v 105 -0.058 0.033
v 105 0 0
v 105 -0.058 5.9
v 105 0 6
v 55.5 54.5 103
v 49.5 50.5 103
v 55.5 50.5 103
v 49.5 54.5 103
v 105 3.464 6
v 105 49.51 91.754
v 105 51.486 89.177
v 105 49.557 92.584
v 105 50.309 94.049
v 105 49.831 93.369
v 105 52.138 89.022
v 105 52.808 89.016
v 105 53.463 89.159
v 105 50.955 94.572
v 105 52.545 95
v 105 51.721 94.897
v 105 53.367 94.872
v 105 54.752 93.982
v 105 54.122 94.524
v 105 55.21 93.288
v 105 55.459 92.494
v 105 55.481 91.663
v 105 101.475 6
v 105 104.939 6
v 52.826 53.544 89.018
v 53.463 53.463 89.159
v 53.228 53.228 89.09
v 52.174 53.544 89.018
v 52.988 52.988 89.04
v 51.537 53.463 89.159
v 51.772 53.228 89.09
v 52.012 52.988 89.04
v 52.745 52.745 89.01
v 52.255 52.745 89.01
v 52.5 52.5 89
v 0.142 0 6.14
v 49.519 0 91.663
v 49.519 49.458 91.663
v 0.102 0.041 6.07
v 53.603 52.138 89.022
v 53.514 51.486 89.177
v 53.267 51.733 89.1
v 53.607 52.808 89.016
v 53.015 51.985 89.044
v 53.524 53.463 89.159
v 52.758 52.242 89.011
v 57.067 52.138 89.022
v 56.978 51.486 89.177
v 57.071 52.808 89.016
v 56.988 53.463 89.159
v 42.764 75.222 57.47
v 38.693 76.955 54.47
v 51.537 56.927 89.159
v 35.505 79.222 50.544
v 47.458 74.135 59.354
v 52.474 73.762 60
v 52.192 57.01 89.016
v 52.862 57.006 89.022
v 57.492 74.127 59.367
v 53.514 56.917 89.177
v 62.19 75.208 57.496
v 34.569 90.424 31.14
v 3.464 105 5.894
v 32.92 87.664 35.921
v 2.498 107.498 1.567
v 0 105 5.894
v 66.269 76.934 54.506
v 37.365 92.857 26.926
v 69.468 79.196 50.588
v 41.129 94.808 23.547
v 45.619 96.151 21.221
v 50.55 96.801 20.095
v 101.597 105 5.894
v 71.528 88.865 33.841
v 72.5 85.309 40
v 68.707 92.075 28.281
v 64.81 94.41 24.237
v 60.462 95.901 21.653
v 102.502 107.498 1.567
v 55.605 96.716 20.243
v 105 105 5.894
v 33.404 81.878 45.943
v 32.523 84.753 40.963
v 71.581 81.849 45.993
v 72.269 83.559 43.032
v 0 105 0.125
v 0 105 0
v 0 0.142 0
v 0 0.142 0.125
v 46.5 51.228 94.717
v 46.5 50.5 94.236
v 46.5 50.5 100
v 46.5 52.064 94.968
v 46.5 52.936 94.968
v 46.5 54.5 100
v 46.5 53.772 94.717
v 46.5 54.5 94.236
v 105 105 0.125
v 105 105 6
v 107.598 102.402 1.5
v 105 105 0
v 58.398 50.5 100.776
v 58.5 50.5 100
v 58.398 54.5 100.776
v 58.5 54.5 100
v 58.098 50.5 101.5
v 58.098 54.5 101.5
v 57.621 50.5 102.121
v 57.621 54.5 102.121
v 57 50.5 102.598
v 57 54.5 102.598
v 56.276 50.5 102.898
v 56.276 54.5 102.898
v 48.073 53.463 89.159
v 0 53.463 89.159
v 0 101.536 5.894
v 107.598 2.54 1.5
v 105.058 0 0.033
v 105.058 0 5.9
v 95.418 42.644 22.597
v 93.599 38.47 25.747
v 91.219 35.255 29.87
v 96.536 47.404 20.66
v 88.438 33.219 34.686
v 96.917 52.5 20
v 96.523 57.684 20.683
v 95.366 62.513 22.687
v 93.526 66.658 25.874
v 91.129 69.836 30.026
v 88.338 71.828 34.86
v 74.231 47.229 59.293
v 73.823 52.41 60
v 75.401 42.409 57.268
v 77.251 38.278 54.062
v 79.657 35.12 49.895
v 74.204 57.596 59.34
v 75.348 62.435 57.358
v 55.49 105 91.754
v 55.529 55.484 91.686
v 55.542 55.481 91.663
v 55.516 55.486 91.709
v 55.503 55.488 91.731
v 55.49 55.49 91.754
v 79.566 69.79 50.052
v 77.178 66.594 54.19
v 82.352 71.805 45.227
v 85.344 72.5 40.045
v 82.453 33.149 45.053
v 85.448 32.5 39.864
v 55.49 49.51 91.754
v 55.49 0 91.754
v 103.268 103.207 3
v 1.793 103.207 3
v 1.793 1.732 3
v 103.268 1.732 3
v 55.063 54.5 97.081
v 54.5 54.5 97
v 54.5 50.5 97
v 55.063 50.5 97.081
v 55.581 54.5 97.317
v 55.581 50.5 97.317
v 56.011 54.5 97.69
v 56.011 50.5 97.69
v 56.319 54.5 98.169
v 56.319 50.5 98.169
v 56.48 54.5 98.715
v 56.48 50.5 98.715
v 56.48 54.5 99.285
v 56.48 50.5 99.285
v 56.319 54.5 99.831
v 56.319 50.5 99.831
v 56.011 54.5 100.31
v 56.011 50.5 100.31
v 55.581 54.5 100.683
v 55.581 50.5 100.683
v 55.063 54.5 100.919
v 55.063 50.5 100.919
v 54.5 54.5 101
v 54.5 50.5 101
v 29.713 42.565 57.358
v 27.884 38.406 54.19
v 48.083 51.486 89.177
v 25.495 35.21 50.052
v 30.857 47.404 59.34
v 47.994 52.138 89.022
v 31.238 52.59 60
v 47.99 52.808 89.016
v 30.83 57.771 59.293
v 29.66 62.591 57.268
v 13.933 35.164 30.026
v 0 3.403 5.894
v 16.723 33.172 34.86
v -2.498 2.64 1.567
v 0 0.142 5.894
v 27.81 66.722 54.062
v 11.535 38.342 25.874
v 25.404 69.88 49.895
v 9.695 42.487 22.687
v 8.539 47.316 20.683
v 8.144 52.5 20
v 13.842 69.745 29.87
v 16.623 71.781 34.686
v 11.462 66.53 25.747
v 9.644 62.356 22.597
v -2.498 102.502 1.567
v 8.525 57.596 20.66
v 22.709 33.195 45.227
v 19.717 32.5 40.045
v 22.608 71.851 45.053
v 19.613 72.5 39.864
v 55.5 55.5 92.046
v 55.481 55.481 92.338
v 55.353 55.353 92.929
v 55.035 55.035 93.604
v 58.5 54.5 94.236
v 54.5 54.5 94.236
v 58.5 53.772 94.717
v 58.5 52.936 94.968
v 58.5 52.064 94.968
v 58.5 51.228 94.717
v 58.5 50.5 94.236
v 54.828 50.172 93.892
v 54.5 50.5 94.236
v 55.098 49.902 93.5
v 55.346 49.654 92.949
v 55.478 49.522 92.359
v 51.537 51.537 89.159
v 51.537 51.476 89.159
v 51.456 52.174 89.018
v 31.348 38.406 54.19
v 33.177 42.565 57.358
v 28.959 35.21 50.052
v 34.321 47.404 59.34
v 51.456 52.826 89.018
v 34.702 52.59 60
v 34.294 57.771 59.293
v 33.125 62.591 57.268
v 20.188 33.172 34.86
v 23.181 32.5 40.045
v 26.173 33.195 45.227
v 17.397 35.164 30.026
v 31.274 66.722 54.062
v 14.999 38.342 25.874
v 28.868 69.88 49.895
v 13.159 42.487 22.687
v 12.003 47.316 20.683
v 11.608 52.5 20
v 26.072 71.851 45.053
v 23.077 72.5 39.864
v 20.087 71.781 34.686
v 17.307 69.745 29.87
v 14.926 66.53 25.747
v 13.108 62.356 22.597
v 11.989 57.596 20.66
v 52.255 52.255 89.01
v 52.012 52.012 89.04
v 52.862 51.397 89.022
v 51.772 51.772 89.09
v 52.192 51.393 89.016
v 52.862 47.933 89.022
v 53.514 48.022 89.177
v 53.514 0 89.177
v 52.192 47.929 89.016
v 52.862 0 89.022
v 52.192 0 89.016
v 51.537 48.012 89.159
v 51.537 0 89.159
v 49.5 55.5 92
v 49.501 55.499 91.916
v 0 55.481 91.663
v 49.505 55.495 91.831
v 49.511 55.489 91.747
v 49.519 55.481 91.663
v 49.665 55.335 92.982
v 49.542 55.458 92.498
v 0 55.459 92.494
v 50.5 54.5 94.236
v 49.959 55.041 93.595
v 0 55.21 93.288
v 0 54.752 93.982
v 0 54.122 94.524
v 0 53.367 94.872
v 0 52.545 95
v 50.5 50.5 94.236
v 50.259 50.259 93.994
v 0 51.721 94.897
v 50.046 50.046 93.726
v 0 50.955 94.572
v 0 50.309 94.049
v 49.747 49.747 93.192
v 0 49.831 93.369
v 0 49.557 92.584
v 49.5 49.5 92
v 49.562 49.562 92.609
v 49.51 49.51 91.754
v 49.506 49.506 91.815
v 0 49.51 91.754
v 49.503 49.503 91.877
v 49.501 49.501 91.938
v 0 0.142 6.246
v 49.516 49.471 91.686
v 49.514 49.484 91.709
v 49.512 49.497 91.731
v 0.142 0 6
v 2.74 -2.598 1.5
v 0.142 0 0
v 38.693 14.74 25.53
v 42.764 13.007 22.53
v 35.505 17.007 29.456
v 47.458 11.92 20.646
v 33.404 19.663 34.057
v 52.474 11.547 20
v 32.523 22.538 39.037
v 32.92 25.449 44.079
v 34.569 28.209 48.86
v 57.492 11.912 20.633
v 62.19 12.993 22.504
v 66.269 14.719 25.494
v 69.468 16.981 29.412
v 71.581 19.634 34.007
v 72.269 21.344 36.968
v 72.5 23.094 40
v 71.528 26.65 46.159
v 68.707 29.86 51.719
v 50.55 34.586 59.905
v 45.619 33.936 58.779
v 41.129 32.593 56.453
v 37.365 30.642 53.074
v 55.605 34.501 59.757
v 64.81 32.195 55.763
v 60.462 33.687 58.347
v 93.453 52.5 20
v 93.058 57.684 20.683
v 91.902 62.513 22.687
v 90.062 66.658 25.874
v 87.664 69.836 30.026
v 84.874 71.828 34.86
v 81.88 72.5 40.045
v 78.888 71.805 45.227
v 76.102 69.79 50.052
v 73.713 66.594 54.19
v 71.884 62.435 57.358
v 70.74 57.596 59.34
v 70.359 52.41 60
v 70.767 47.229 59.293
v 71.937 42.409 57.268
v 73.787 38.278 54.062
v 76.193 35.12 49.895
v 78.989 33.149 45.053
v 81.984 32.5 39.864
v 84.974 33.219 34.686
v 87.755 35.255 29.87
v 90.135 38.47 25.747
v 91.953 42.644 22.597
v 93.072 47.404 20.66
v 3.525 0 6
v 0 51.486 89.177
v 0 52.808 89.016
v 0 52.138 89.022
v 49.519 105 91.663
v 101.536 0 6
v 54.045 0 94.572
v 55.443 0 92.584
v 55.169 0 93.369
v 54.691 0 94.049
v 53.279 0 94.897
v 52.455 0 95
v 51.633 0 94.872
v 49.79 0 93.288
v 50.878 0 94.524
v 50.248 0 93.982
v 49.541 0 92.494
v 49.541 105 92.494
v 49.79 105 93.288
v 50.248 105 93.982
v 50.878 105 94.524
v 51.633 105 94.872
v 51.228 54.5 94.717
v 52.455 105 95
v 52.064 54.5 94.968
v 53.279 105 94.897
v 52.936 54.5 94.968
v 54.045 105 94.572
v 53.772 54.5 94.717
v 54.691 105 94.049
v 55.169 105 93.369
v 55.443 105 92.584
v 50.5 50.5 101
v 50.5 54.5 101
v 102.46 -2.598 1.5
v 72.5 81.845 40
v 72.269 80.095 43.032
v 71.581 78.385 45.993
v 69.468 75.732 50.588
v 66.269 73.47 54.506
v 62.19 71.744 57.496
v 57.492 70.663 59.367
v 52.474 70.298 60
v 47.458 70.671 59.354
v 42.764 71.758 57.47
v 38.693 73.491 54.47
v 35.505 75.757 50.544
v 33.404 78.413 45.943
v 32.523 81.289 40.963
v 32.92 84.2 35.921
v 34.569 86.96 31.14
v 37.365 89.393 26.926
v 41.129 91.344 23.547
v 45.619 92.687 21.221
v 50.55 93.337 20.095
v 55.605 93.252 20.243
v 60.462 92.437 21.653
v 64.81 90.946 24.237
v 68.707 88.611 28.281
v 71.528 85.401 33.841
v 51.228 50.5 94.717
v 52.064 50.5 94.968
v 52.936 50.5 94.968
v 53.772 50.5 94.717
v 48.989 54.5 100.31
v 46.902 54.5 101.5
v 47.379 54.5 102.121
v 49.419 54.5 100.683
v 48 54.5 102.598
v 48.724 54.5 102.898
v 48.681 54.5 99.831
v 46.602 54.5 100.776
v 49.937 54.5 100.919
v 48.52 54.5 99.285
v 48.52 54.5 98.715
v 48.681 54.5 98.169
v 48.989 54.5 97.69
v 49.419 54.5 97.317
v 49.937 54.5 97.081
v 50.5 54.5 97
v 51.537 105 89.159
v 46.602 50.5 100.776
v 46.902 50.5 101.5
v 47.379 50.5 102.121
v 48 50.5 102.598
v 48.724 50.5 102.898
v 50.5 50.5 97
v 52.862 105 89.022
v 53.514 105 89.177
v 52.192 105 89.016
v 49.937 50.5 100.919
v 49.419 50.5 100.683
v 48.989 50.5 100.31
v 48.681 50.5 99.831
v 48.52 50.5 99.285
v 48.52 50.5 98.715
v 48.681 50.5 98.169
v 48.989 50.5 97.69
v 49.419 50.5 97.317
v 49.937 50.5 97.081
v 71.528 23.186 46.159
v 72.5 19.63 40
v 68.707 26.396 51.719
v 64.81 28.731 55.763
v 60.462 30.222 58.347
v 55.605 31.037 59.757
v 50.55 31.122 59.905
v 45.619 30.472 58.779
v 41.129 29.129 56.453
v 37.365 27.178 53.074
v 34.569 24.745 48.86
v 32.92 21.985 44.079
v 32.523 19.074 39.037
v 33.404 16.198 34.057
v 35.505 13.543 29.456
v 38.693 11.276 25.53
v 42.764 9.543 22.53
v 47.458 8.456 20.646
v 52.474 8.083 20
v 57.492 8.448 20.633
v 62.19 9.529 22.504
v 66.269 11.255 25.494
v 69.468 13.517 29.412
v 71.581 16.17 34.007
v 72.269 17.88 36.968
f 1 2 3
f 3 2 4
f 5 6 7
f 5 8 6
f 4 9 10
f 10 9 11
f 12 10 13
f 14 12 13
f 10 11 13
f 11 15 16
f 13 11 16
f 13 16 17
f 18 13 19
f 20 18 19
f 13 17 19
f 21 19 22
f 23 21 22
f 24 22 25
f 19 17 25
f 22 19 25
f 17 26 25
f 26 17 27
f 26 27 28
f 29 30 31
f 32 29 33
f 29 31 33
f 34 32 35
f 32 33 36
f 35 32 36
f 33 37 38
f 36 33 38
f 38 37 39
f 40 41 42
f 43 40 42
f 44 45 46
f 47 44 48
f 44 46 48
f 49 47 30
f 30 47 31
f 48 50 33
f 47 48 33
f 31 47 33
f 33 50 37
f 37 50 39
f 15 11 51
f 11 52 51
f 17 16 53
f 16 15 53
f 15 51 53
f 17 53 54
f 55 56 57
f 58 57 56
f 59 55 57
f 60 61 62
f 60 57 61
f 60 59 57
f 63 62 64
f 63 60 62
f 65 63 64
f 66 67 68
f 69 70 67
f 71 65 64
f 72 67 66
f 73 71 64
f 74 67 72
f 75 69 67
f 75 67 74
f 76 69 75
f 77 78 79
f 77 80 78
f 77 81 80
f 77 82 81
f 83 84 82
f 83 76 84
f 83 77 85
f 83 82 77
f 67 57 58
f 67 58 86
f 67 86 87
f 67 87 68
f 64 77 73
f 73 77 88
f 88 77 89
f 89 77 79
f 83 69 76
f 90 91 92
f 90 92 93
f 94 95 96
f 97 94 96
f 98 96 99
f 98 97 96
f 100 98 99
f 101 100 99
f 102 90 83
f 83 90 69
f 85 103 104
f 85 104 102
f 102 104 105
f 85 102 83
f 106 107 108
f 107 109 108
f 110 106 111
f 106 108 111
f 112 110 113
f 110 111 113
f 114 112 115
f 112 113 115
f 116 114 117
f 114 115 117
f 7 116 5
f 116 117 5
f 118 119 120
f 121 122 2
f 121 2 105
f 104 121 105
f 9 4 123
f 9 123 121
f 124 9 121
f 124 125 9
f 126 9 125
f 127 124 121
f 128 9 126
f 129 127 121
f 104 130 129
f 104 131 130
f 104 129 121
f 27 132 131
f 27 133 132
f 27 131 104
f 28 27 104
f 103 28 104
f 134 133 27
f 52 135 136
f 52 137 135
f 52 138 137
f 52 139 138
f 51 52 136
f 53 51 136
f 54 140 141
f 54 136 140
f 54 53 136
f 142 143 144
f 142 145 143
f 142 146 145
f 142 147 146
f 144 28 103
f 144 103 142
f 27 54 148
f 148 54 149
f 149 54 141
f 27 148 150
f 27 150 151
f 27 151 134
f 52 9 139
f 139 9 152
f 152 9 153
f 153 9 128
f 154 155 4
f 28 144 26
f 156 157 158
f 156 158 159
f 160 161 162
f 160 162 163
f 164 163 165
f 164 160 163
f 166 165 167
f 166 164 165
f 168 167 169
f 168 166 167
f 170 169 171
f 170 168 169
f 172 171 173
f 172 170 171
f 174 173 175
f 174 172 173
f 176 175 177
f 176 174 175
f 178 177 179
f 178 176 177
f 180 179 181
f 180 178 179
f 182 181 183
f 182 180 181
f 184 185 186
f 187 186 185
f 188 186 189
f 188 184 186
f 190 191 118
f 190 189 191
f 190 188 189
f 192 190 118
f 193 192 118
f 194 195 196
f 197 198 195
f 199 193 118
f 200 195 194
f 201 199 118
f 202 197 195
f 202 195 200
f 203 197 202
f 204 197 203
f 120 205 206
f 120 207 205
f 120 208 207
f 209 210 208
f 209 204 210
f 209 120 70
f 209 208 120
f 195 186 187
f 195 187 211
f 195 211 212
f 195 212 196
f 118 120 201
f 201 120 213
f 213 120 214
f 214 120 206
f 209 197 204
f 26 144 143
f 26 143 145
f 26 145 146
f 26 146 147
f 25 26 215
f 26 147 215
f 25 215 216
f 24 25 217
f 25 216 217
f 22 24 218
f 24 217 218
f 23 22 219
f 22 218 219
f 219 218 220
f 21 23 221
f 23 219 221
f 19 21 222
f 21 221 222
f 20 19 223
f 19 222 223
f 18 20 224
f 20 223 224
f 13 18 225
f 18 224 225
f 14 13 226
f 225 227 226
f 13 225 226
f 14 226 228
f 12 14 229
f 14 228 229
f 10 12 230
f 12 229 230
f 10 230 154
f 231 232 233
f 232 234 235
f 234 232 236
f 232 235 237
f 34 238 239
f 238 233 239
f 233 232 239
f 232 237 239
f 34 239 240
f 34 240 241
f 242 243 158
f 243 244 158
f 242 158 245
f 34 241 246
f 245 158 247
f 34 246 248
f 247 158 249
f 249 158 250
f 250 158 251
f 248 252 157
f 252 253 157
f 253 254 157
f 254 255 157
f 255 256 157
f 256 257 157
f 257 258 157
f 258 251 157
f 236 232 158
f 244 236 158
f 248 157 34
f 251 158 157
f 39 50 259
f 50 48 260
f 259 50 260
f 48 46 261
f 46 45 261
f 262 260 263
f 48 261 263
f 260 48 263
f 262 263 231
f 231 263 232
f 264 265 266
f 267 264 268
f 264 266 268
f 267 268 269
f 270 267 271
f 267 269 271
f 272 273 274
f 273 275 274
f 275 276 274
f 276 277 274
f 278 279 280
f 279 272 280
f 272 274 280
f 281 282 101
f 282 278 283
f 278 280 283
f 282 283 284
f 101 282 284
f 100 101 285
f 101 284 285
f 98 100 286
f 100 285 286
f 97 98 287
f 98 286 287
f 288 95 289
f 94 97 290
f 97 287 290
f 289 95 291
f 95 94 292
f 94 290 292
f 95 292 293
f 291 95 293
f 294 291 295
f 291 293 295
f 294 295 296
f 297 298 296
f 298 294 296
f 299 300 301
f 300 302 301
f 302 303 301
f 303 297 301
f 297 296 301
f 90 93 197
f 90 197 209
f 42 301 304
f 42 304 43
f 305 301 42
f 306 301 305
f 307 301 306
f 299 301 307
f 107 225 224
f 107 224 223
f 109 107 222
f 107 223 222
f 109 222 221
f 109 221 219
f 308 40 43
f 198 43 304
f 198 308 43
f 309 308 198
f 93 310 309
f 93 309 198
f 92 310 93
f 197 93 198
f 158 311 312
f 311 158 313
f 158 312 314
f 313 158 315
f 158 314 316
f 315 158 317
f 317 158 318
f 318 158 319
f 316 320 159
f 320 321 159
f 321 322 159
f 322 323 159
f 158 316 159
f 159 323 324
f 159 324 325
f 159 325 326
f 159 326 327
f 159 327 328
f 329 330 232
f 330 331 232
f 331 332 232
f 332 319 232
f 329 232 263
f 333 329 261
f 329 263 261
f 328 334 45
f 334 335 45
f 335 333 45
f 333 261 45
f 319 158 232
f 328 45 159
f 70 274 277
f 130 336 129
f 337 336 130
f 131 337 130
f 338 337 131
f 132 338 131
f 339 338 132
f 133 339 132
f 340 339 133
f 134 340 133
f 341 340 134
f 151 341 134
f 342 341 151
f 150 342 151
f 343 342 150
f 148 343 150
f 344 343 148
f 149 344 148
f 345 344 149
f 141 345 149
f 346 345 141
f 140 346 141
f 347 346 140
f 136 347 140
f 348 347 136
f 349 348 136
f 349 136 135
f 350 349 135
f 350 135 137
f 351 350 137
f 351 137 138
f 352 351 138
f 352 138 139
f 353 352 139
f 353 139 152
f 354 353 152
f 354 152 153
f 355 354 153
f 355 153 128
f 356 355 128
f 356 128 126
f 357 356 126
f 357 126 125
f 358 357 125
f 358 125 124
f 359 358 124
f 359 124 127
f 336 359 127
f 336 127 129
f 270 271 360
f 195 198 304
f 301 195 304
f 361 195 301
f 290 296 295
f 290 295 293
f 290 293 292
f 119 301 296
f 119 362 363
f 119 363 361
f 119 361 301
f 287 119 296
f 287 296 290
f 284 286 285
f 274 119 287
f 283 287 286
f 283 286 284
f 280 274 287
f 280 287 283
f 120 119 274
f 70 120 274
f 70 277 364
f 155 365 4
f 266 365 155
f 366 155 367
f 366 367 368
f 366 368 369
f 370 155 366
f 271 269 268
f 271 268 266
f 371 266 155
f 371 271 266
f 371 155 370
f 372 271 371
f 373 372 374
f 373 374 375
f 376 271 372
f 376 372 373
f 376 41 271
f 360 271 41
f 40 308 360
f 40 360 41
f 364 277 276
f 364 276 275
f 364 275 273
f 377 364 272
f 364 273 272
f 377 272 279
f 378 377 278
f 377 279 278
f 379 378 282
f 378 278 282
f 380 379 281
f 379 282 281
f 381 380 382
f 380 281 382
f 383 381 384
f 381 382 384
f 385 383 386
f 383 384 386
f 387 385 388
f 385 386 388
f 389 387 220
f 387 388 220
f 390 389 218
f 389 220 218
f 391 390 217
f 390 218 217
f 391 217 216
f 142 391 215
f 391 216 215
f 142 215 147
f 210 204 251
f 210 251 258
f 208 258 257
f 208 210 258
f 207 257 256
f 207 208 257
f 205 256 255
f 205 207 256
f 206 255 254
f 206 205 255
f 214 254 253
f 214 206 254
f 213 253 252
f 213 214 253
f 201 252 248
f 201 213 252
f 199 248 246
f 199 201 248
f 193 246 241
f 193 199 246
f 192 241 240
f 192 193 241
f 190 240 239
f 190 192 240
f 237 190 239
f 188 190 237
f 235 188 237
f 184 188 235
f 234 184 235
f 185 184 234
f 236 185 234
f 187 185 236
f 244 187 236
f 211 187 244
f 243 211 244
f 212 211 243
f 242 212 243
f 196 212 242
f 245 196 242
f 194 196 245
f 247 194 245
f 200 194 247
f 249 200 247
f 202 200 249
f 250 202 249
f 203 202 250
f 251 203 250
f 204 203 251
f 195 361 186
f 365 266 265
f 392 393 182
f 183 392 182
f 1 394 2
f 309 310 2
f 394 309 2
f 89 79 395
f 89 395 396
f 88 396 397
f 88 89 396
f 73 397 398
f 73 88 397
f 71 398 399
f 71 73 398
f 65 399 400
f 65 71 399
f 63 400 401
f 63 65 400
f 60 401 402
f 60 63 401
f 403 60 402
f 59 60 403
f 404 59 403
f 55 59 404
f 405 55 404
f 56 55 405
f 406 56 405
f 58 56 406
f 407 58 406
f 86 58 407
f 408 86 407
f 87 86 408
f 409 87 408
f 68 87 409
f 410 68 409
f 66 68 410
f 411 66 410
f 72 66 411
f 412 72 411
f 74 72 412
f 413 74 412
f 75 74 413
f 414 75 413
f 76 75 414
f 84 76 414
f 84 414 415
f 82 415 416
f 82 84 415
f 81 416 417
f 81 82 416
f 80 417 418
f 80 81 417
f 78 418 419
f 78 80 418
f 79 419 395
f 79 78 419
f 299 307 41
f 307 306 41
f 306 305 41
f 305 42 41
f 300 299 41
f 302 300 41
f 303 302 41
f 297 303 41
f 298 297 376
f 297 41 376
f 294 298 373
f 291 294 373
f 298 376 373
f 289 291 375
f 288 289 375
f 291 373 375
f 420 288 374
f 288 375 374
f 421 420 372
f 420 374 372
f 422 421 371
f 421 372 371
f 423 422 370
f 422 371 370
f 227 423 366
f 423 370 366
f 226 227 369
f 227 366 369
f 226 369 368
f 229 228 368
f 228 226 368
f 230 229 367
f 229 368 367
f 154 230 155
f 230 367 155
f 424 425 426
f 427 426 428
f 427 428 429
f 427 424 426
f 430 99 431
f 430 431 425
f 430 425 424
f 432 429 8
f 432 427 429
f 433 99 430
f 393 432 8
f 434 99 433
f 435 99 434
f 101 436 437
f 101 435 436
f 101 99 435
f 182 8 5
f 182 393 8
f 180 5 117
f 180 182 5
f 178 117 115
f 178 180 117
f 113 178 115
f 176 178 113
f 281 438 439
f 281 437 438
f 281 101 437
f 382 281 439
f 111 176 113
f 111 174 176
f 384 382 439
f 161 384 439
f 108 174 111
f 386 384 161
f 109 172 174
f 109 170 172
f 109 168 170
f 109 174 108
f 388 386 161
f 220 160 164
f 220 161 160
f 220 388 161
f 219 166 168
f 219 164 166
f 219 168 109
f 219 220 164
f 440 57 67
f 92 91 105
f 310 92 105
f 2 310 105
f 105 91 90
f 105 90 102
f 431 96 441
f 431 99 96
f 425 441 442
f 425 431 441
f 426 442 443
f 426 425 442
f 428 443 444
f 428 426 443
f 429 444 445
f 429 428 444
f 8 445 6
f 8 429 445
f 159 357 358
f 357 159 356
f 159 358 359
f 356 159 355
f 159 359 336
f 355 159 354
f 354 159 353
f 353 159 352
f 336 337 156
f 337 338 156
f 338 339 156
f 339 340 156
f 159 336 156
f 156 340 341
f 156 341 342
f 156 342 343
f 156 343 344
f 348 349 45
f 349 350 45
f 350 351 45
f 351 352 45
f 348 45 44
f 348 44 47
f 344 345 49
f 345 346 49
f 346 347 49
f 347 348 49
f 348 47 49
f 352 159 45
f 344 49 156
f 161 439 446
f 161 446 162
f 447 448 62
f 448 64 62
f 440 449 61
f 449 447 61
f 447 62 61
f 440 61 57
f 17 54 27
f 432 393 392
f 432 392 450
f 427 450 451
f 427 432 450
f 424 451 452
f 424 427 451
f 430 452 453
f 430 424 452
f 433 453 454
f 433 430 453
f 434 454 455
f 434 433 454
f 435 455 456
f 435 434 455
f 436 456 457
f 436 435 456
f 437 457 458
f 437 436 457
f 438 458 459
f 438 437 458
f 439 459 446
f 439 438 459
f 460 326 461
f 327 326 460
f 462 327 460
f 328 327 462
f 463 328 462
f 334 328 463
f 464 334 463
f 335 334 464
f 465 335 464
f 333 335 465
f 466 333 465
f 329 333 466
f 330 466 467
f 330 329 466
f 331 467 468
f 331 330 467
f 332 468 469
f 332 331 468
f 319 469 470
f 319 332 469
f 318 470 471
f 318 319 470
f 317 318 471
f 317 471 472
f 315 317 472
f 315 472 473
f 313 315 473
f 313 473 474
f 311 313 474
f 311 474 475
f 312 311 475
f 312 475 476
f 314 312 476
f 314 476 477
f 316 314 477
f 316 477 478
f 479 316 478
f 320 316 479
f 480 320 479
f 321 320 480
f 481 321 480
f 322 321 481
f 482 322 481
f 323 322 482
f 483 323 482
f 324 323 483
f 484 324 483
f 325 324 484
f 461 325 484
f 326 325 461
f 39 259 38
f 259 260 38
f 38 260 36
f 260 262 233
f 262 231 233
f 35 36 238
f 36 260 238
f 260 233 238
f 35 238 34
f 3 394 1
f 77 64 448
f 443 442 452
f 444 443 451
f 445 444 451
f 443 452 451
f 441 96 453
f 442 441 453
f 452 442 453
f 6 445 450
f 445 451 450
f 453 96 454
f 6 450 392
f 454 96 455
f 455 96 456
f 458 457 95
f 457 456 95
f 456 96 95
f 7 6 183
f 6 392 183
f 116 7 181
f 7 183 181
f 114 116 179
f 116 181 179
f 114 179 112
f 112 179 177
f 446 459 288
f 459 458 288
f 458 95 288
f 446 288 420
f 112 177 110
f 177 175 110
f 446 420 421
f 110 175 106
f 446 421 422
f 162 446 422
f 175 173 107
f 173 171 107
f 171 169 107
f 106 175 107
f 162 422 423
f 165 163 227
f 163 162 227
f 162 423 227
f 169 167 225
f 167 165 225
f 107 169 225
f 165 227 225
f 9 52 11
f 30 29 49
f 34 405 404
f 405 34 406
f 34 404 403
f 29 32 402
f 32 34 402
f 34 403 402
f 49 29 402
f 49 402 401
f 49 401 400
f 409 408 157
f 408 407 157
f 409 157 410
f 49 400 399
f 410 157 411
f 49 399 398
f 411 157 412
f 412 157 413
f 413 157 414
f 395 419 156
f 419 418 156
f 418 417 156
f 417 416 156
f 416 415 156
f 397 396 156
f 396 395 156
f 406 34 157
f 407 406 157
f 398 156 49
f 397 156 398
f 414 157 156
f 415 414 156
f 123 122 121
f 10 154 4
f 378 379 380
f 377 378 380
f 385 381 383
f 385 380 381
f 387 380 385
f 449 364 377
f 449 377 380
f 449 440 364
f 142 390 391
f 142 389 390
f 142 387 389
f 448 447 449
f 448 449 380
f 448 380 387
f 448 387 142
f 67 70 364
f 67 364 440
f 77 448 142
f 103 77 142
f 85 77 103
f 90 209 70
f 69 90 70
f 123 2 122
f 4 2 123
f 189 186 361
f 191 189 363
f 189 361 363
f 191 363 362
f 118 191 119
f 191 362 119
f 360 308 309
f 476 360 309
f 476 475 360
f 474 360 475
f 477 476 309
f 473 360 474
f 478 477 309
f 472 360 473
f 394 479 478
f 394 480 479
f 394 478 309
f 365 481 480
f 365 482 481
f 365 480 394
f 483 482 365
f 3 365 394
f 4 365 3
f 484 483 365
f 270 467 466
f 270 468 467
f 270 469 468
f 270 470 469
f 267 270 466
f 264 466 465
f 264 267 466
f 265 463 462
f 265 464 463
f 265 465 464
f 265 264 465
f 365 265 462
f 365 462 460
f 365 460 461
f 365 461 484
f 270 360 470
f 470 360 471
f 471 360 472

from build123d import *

# Parameters (mm, degrees)
BOX008_W                  = 10
BOX008_H                  = 10
BOX008_DEPTH              = 10
BOX008_PLACEMENT_ANGLE    = 45
BOX010_W                  = 10
BOX010_H                  = 10
BOX010_DEPTH              = 10
BOX010_PLACEMENT_ANGLE    = 45
BOX011_W                  = 10
BOX011_H                  = 10
BOX011_DEPTH              = 10
BOX011_PLACEMENT_ANGLE    = 45
BOX009_W                  = 10
BOX009_H                  = 10
BOX009_DEPTH              = 10
BOX009_PLACEMENT_ANGLE    = 45
CYLINDER002_R             = 20
CYLINDER002_DEPTH         = 105
CYLINDER003_R             = 20
CYLINDER003_DEPTH         = 105
CYLINDER001_R             = 3
CYLINDER001_DEPTH         = 105
BOX004_W                  = 105
BOX004_H                  = 105
BOX004_DEPTH              = 3
BOX004_PLACEMENT_ANGLE    = 60
BOX005_W                  = 105
BOX005_H                  = 105
BOX005_DEPTH              = 3
BOX005_PLACEMENT_ANGLE    = 60
BOX006_W                  = 105
BOX006_H                  = 105
BOX006_DEPTH              = 3
FUSION001_PLACEMENT_ANGLE = 90
CYLINDER_R                = 3
CYLINDER_DEPTH            = 105
BOX003_W                  = 105
BOX003_H                  = 105
BOX003_DEPTH              = 3
BOX003_PLACEMENT_ANGLE    = 300
BOX002_W                  = 105
BOX002_H                  = 105
BOX002_DEPTH              = 3
BOX002_PLACEMENT_ANGLE    = 60
BOX001_W                  = 105
BOX001_H                  = 105
BOX001_DEPTH              = 3
CYLINDER005_R             = 2
CYLINDER005_DEPTH         = 10
CYLINDER004_R             = 2
CYLINDER004_DEPTH         = 10
BOX007_W                  = 4
BOX007_H                  = 4
BOX007_DEPTH              = 10
FUSION004_PLACEMENT_ANGLE = 90
BOX_W                     = 12
BOX_H                     = 4
BOX_DEPTH                 = 12
FILLET_R                  = 3


with BuildPart() as cube008:
    # Box008 → Box008 (new body)
    with BuildSketch(Plane.XY):
        with Locations((5, 5)):
            Rectangle(BOX008_W, BOX008_H)
    extrude(amount=BOX008_DEPTH)


with BuildPart() as cube008_1:
    # Box008 placement: moved
    add(cube008.part.moved(Location((-3, -11, 0))).rotate(Axis((-3, -11, 0), (0, 0, 1)), BOX008_PLACEMENT_ANGLE))


with BuildPart() as cube010:
    # Box010 → Box010 (new body)
    with BuildSketch(Plane.XY):
        with Locations((5, 5)):
            Rectangle(BOX010_W, BOX010_H)
    extrude(amount=BOX010_DEPTH)


with BuildPart() as cube010_1:
    # Box010 placement: moved
    add(cube010.part.moved(Location((108.2, -11, 0))).rotate(Axis((108.2, -11, 0), (0, 0, 1)), BOX010_PLACEMENT_ANGLE))


with BuildPart() as cube011:
    # Box011 → Box011 (new body)
    with BuildSketch(Plane.XY):
        with Locations((5, 5)):
            Rectangle(BOX011_W, BOX011_H)
    extrude(amount=BOX011_DEPTH)


with BuildPart() as cube011_1:
    # Box011 placement: moved
    add(cube011.part.moved(Location((108.2, 101.8, 0))).rotate(Axis((108.2, 101.8, 0), (0, 0, 1)), BOX011_PLACEMENT_ANGLE))


with BuildPart() as fusion005:
    # Box009 → Box009 (new body)
    with BuildSketch(Plane.XY):
        with Locations((5, 5)):
            Rectangle(BOX009_W, BOX009_H)
    extrude(amount=BOX009_DEPTH)


with BuildPart() as fusion005_1:
    # Box009 placement: moved
    add(fusion005.part.moved(Location((-3, 102, 0))).rotate(Axis((-3, 102, 0), (0, 0, 1)), BOX009_PLACEMENT_ANGLE))

    # Fusion005: union Cube008, Cube010, Cube011
    add(cube008_1.part)
    add(cube010_1.part)
    add(cube011_1.part)


with BuildPart() as cylinder002:
    # Cylinder002 → Cylinder002 (new body)
    with BuildSketch(Plane(origin=(52.5, 105, 40), x_dir=(1, 0, 0), z_dir=(0, -1, 0))):
        Circle(CYLINDER002_R)
    extrude(amount=CYLINDER002_DEPTH)


with BuildPart() as fusion003:
    # Cylinder003 → Cylinder003 (new body)
    with BuildSketch(Plane(origin=(0, 52.5, 40), x_dir=(0, 0, -1), z_dir=(1, 0, 0))):
        Circle(CYLINDER003_R)
    extrude(amount=CYLINDER003_DEPTH)

    # Fusion003: union Cylinder002
    add(cylinder002.part)


with BuildPart() as cylinder001:
    # Cylinder001 → Cylinder001 (new body)
    with BuildSketch(Plane(origin=(0, 52.5, 92), x_dir=(0, 0, -1), z_dir=(1, 0, 0))):
        Circle(CYLINDER001_R)
    extrude(amount=CYLINDER001_DEPTH)


with BuildPart() as cube004:
    # Box004 → Box004 (new body)
    with BuildSketch(Plane.XY):
        with Locations((52.5, 52.5)):
            Rectangle(BOX004_W, BOX004_H)
    extrude(amount=BOX004_DEPTH)


with BuildPart() as cube004_1:
    # Box004 placement: moved
    add(cube004.part.moved(Location((0, 52.4, 91))).rotate(Axis((0, 52.4, 91), (-1, 0, 0)), BOX004_PLACEMENT_ANGLE))


with BuildPart() as cube005:
    # Box005 → Box005 (new body)
    with BuildSketch(Plane.XY):
        with Locations((52.5, 52.5)):
            Rectangle(BOX005_W, BOX005_H)
    extrude(amount=BOX005_DEPTH)


with BuildPart() as cube005_1:
    # Box005 placement: moved
    add(cube005.part.rotate(Axis((0, 0, 0), (1, 0, 0)), BOX005_PLACEMENT_ANGLE))


with BuildPart() as fusion001:
    # Box006 → Box006 (new body)
    with BuildSketch(Plane.XY):
        with Locations((52.5, 52.5)):
            Rectangle(BOX006_W, BOX006_H)
    extrude(amount=BOX006_DEPTH)

    # Fusion001: union Cylinder001, Cube004, Cube005
    add(cylinder001.part)
    add(cube004_1.part)
    add(cube005_1.part)


with BuildPart() as fusion001_1:
    # Fusion001 placement: moved
    add(fusion001.part.moved(Location((105, 0, 0))).rotate(Axis((105, 0, 0), (0, 0, 1)), FUSION001_PLACEMENT_ANGLE))


with BuildPart() as cylinder:
    # Cylinder → Cylinder (new body)
    with BuildSketch(Plane(origin=(0, 52.5, 92), x_dir=(0, 0, -1), z_dir=(1, 0, 0))):
        Circle(CYLINDER_R)
    extrude(amount=CYLINDER_DEPTH)


with BuildPart() as cube003:
    # Box003 → Box003 (new body)
    with BuildSketch(Plane.XY):
        with Locations((52.5, 52.5)):
            Rectangle(BOX003_W, BOX003_H)
    extrude(amount=BOX003_DEPTH)


with BuildPart() as cube003_1:
    # Box003 placement: moved
    add(cube003.part.moved(Location((0, 52.4, 91))).rotate(Axis((0, 52.4, 91), (1, 0, 0)), BOX003_PLACEMENT_ANGLE))


with BuildPart() as cube002:
    # Box002 → Box002 (new body)
    with BuildSketch(Plane.XY):
        with Locations((52.5, 52.5)):
            Rectangle(BOX002_W, BOX002_H)
    extrude(amount=BOX002_DEPTH)


with BuildPart() as cube002_1:
    # Box002 placement: moved
    add(cube002.part.rotate(Axis((0, 0, 0), (1, 0, 0)), BOX002_PLACEMENT_ANGLE))


with BuildPart() as cut002:
    # Box001 → Box001 (new body)
    with BuildSketch(Plane.XY):
        with Locations((52.5, 52.5)):
            Rectangle(BOX001_W, BOX001_H)
    extrude(amount=BOX001_DEPTH)

    # Fusion: union Cylinder, Cube003, Cube002
    add(cylinder.part)
    add(cube003_1.part)
    add(cube002_1.part)

    # Fusion002: union Fusion001
    add(fusion001_1.part)

    # Cut: cut Fusion003
    add(fusion003.part, mode=Mode.SUBTRACT)

    # Cut002: cut Fusion005
    add(fusion005_1.part, mode=Mode.SUBTRACT)


with BuildPart() as cylinder005:
    # Cylinder005 → Cylinder005 (new body)
    with BuildSketch(Plane.XY):
        Circle(CYLINDER005_R)
    extrude(amount=CYLINDER005_DEPTH)


with BuildPart() as cylinder004:
    # Cylinder004 → Cylinder004 (new body)
    with BuildSketch(Plane(origin=(4, 0, 0), x_dir=(1, 0, 0), z_dir=(0, 0, 1))):
        Circle(CYLINDER004_R)
    extrude(amount=CYLINDER004_DEPTH)


with BuildPart() as fusion004:
    # Box007 → Box007 (new body)
    with BuildSketch(Plane(origin=(0, -2, 0), x_dir=(1, 0, 0), z_dir=(0, 0, 1))):
        with Locations((2, 2)):
            Rectangle(BOX007_W, BOX007_H)
    extrude(amount=BOX007_DEPTH)

    # Fusion004: union Cylinder005, Cylinder004
    add(cylinder005.part)
    add(cylinder004.part)


with BuildPart() as fusion004_1:
    # Fusion004 placement: moved
    add(fusion004.part.moved(Location((50.5, 57, 99))).rotate(Axis((50.5, 57, 99), (1, 0, 0)), FUSION004_PLACEMENT_ANGLE))


with BuildPart() as birdhaus_draft:
    # Box → Box (new body)
    with BuildSketch(Plane(origin=(46.5, 50.5, 91), x_dir=(1, 0, 0), z_dir=(0, 0, 1))):
        with Locations((6, 2)):
            Rectangle(BOX_W, BOX_H)
    extrude(amount=BOX_DEPTH)

    # Fillet
    fillet_edges = [birdhaus_draft.edges().sort_by_distance(p)[0] for p in [
        (46.5, 52.5, 103),
        (58.5, 52.5, 103),
    ]]
    fillet(fillet_edges, radius=FILLET_R)

    # Cut001: cut Fusion004
    add(fusion004_1.part, mode=Mode.SUBTRACT)

    # Fusion006: union Cut002
    add(cut002.part)


solid = birdhaus_draft.part
